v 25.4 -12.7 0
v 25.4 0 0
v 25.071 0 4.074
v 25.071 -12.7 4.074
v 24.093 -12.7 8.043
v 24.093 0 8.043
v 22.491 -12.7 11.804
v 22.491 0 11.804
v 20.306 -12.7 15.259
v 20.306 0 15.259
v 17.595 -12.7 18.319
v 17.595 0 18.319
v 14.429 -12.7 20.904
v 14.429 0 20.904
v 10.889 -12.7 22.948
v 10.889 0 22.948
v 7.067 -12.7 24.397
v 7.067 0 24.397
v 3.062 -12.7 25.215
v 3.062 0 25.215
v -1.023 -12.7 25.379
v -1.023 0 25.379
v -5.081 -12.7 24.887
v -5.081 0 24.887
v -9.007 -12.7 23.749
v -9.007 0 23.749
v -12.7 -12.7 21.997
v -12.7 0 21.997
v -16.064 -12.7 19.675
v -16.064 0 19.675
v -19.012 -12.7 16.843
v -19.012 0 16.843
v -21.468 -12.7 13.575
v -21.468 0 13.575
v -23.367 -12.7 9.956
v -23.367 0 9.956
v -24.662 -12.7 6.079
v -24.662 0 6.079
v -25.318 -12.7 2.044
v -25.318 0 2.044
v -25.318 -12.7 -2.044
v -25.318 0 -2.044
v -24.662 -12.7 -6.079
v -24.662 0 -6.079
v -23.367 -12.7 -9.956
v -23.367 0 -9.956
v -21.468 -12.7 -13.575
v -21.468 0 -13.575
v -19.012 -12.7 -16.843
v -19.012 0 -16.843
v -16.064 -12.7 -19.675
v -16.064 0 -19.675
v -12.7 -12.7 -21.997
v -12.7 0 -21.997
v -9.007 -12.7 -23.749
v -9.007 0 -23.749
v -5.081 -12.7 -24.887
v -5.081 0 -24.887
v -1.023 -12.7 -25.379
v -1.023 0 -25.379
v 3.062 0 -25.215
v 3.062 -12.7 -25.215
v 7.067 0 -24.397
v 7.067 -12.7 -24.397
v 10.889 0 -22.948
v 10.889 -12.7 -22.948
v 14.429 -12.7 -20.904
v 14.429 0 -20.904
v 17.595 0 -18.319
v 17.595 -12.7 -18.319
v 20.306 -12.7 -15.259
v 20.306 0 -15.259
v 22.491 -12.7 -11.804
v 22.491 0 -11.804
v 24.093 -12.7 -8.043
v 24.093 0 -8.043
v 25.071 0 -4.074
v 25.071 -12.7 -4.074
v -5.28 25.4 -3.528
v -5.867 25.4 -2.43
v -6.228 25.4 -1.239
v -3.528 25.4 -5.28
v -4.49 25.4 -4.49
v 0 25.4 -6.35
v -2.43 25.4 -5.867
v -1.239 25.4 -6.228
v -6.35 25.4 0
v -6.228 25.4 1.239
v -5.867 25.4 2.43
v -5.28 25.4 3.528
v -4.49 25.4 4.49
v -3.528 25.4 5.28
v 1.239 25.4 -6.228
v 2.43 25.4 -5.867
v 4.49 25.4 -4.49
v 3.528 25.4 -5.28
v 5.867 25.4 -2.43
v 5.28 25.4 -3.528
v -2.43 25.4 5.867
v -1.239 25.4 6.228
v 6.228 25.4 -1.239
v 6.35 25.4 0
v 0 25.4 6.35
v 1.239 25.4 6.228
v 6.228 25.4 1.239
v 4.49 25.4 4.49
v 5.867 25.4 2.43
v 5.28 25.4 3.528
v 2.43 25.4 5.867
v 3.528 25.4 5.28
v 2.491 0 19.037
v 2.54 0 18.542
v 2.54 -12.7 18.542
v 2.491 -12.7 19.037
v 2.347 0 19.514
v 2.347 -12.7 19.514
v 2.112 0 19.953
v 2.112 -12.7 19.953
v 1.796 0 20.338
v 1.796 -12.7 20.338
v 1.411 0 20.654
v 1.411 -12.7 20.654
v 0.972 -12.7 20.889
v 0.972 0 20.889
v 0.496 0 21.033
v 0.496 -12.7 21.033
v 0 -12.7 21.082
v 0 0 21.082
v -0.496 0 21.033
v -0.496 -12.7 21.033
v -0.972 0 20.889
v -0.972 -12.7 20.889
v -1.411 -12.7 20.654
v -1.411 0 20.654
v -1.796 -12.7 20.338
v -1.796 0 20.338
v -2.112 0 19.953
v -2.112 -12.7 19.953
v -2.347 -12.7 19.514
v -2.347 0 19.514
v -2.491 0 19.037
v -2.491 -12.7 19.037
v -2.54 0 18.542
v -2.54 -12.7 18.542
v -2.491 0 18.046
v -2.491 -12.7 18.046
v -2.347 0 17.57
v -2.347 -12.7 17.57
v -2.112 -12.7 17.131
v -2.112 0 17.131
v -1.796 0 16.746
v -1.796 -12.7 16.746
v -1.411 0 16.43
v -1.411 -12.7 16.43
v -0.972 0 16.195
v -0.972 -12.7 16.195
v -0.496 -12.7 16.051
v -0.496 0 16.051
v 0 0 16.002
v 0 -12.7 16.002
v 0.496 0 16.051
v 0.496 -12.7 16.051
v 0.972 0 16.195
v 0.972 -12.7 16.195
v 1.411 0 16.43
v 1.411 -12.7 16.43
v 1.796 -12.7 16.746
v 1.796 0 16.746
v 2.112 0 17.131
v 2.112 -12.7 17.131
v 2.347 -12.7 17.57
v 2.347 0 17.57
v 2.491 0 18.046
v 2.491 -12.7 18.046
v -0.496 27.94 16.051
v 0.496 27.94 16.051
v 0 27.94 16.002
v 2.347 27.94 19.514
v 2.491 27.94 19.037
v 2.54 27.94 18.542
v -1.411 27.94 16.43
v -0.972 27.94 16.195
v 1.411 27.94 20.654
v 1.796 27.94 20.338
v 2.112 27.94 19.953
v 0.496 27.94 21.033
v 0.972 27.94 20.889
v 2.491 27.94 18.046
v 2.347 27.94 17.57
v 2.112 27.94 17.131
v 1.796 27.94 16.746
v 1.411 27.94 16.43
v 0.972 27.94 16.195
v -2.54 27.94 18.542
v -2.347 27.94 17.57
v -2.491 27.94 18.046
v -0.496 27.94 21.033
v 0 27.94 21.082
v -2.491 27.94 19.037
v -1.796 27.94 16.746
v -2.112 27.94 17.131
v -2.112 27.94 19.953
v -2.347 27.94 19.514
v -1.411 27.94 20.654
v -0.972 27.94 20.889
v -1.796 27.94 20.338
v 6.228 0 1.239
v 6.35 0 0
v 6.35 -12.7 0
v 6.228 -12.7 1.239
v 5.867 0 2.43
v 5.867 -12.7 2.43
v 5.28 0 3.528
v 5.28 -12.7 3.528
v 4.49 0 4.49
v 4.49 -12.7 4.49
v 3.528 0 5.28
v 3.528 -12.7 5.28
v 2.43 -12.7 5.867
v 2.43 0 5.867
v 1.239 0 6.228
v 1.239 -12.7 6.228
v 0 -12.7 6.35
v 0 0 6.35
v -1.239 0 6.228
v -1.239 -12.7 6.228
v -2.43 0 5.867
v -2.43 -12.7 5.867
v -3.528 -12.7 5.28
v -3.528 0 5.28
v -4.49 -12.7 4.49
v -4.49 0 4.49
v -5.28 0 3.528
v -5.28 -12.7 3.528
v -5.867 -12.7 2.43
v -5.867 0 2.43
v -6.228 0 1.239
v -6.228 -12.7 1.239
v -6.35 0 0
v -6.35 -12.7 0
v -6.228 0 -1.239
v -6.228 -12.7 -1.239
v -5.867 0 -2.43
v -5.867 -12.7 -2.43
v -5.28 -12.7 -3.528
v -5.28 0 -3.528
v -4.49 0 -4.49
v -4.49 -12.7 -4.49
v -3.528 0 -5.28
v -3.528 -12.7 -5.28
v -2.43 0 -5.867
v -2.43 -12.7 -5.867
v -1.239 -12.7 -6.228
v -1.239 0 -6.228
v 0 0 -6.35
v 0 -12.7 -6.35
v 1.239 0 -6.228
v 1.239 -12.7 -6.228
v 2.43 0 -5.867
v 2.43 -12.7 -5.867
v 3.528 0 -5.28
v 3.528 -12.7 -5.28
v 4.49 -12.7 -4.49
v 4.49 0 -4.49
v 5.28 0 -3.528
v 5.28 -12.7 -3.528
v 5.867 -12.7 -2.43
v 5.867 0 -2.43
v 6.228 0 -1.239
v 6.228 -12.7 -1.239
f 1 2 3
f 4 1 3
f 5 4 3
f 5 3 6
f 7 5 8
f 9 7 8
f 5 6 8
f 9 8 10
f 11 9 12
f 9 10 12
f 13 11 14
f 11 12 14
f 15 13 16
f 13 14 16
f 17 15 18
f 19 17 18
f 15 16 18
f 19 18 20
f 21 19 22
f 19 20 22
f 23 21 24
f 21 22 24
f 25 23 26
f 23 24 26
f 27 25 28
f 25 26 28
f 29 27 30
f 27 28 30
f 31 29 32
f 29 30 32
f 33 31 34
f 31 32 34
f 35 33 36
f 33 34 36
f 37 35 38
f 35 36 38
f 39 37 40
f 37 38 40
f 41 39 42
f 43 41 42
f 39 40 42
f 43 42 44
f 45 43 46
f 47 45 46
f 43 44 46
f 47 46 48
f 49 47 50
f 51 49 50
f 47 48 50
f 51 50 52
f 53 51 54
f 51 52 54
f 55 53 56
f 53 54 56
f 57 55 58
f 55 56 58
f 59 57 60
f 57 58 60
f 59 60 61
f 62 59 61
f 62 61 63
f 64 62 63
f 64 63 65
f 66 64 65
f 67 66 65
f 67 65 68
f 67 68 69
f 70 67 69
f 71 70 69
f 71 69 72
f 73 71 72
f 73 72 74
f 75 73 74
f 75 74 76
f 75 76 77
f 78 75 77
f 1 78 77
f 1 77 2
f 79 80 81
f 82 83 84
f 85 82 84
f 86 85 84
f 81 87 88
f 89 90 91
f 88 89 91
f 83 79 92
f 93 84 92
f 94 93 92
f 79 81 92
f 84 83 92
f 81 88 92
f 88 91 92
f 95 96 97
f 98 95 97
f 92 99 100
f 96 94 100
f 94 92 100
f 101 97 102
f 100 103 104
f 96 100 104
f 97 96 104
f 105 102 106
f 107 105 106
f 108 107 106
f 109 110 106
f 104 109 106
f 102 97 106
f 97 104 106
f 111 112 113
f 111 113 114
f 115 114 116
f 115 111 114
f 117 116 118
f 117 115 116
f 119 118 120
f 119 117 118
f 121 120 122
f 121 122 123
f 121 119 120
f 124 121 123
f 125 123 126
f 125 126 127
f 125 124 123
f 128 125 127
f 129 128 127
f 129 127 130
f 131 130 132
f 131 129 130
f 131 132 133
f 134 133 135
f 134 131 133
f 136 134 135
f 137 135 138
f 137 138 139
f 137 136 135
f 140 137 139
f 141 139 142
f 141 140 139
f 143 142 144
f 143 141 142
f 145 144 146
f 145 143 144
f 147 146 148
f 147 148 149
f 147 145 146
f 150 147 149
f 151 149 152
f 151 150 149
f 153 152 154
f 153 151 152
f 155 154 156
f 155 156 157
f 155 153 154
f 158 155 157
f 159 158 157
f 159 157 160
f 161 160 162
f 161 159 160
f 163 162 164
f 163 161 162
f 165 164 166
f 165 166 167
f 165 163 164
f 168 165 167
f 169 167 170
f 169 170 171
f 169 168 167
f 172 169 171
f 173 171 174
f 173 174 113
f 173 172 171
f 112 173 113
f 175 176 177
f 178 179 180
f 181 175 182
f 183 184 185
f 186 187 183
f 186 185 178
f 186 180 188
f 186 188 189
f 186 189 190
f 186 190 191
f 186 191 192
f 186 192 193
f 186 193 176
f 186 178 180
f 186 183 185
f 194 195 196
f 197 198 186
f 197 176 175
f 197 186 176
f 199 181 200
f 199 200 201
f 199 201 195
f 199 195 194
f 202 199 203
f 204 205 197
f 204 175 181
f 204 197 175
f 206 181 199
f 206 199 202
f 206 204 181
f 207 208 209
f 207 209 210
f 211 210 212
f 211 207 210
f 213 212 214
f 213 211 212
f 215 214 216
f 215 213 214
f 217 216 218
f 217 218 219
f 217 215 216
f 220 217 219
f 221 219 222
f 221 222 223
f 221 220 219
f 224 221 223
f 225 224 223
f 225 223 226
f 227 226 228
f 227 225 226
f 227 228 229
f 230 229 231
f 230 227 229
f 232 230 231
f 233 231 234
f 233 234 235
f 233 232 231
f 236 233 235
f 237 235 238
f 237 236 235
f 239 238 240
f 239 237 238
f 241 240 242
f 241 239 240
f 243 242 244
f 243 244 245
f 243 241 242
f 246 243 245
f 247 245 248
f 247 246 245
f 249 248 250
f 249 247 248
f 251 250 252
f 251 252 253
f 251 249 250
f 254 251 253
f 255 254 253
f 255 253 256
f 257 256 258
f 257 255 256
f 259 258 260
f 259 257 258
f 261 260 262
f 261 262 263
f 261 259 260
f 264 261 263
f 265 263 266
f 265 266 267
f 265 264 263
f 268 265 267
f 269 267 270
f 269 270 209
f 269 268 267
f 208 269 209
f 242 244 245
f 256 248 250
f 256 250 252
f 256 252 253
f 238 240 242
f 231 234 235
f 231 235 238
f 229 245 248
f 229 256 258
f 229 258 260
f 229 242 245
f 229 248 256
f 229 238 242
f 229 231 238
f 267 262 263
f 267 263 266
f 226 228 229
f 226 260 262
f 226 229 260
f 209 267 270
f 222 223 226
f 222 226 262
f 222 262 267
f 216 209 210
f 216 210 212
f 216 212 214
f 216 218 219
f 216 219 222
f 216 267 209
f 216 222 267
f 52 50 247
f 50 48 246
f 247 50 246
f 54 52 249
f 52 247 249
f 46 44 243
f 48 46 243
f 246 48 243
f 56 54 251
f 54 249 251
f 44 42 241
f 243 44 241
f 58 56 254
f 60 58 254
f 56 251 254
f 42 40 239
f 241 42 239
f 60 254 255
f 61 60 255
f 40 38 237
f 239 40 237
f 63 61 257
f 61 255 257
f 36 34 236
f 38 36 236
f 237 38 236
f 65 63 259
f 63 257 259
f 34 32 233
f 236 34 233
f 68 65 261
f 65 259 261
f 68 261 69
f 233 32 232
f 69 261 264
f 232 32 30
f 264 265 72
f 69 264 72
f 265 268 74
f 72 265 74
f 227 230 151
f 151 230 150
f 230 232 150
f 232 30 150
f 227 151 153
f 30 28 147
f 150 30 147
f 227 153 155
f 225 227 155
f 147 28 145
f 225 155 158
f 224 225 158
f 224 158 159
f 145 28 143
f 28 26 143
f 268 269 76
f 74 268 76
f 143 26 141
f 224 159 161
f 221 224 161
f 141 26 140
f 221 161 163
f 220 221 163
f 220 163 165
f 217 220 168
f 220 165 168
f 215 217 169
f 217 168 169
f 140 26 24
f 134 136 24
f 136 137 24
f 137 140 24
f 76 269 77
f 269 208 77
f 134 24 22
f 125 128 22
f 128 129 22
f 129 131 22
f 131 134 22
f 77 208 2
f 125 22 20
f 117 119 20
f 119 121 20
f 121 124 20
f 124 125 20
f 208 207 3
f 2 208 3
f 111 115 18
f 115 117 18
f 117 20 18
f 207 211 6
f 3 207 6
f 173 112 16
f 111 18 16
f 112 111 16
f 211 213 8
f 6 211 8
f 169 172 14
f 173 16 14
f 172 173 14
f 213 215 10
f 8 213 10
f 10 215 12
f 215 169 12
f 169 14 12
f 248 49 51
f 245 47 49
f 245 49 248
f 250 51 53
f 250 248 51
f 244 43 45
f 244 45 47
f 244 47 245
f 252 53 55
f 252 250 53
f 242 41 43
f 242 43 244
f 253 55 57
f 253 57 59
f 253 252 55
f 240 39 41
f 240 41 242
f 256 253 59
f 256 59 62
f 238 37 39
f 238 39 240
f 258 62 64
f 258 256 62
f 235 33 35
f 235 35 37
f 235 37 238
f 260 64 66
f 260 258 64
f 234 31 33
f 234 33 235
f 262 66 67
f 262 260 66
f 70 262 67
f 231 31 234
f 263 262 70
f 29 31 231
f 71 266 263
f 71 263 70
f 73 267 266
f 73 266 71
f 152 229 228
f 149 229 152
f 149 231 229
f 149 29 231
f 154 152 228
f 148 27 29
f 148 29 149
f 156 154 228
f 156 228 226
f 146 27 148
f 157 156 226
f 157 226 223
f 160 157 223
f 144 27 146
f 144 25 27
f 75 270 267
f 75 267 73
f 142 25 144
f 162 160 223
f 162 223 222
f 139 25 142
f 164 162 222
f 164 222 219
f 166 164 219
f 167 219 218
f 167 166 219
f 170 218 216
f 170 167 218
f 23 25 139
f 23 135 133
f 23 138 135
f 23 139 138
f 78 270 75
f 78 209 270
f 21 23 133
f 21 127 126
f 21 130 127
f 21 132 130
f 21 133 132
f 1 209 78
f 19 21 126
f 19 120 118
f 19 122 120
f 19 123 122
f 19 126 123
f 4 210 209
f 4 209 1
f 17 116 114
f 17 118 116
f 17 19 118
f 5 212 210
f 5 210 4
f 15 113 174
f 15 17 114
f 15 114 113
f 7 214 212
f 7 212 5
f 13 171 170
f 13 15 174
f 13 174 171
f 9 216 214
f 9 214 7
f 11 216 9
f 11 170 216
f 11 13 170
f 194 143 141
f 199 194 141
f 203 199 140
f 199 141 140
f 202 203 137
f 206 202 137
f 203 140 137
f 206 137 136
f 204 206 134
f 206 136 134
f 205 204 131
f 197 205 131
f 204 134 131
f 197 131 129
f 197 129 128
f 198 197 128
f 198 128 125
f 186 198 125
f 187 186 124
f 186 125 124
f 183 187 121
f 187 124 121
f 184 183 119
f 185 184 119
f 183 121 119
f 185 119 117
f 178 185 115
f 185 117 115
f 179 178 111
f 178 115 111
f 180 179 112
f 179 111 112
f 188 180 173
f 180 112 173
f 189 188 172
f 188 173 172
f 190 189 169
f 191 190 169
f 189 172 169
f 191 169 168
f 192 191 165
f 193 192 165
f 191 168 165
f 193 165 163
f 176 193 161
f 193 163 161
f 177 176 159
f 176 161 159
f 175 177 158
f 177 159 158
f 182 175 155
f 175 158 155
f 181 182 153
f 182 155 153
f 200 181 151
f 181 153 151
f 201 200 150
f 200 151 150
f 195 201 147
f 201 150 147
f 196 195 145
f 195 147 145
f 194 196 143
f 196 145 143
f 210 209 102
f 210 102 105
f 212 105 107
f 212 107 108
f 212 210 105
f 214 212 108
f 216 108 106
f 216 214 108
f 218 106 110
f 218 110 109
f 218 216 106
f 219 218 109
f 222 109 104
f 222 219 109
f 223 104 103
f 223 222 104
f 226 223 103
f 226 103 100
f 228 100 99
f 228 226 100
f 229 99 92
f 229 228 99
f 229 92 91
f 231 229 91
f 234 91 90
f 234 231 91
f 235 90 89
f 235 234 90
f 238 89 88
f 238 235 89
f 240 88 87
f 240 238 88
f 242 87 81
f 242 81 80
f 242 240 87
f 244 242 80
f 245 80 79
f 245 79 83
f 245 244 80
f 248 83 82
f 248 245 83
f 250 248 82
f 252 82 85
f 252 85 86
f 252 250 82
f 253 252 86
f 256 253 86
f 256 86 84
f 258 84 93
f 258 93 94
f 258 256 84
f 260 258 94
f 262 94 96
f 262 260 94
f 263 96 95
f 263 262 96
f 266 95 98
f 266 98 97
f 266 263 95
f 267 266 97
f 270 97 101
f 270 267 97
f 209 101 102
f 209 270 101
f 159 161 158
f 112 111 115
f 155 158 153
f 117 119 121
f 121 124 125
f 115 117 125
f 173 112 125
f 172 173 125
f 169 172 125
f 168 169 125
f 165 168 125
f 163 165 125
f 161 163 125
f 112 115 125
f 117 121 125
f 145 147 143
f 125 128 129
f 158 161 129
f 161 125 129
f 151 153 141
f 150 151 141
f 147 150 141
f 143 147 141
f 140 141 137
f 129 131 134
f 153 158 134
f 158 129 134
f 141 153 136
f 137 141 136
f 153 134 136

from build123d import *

# Parameters (mm, degrees)
F0_R     = 25.4
F0_R_2   = 6.35
F0_R_3   = 2.54
F1_DEPTH = 12.7
F2_R     = 6.35
F3_DEPTH = 38.1
F5_R     = 2.54
F6_DEPTH = 27.94


with BuildPart() as f1:
    # F0 (on Front) → F1 (new body)
    with BuildSketch(Plane.XZ):
        Circle(F0_R)
        Circle(F0_R_2, mode=Mode.SUBTRACT)
        with Locations((0, 18.5419153422)):
            Circle(F0_R_3, mode=Mode.SUBTRACT)
    extrude(amount=F1_DEPTH)


with BuildPart() as f3:
    # F2 (on face) → F3 (new body)
    with BuildSketch(Plane.XZ.offset(12.7)):
        Circle(F2_R)
    extrude(amount=-F3_DEPTH)


with BuildPart() as f6:
    # F5 (on face) → F6 (new body)
    with BuildSketch(Plane(origin=(0, 0, 0), x_dir=(-1, 0, 0), z_dir=(0, 1, 0))):
        with Locations((0, 18.5419153422)):
            Circle(F5_R)
    extrude(amount=F6_DEPTH)


solid = Compound([f1.part, f3.part, f6.part])
